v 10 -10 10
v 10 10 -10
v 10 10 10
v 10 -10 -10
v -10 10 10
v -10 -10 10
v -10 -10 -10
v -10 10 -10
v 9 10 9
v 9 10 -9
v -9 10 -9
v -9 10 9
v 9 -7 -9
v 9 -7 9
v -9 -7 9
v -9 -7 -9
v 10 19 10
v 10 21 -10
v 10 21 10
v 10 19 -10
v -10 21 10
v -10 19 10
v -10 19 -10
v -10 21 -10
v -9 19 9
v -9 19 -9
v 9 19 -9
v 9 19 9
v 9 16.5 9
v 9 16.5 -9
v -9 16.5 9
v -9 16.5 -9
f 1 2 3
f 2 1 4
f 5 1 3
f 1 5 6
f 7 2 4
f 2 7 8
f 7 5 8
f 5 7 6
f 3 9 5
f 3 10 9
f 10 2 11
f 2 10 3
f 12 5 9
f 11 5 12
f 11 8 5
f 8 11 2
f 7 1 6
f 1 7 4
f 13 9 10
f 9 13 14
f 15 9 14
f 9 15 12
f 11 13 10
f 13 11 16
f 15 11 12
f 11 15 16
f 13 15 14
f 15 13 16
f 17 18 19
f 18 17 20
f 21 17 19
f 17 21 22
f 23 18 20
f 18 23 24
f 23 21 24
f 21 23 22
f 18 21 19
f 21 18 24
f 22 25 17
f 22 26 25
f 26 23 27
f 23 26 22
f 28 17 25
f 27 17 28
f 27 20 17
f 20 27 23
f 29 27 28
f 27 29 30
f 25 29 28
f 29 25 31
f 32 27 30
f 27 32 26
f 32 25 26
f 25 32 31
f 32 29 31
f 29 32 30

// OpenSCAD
// Resolution
$fn = 100;

// BOX
difference() {
    translate([0,0,0]) cube(20, center=true); // Outer
    translate([0,2,0]) cube(18, center=true); // Remove 
}

// LID
translate([0,20,0]) cube([20, 2, 20], center=true); // Cover
translate([0,18,0]) cube([18, 3, 18], center=true); // Inner
